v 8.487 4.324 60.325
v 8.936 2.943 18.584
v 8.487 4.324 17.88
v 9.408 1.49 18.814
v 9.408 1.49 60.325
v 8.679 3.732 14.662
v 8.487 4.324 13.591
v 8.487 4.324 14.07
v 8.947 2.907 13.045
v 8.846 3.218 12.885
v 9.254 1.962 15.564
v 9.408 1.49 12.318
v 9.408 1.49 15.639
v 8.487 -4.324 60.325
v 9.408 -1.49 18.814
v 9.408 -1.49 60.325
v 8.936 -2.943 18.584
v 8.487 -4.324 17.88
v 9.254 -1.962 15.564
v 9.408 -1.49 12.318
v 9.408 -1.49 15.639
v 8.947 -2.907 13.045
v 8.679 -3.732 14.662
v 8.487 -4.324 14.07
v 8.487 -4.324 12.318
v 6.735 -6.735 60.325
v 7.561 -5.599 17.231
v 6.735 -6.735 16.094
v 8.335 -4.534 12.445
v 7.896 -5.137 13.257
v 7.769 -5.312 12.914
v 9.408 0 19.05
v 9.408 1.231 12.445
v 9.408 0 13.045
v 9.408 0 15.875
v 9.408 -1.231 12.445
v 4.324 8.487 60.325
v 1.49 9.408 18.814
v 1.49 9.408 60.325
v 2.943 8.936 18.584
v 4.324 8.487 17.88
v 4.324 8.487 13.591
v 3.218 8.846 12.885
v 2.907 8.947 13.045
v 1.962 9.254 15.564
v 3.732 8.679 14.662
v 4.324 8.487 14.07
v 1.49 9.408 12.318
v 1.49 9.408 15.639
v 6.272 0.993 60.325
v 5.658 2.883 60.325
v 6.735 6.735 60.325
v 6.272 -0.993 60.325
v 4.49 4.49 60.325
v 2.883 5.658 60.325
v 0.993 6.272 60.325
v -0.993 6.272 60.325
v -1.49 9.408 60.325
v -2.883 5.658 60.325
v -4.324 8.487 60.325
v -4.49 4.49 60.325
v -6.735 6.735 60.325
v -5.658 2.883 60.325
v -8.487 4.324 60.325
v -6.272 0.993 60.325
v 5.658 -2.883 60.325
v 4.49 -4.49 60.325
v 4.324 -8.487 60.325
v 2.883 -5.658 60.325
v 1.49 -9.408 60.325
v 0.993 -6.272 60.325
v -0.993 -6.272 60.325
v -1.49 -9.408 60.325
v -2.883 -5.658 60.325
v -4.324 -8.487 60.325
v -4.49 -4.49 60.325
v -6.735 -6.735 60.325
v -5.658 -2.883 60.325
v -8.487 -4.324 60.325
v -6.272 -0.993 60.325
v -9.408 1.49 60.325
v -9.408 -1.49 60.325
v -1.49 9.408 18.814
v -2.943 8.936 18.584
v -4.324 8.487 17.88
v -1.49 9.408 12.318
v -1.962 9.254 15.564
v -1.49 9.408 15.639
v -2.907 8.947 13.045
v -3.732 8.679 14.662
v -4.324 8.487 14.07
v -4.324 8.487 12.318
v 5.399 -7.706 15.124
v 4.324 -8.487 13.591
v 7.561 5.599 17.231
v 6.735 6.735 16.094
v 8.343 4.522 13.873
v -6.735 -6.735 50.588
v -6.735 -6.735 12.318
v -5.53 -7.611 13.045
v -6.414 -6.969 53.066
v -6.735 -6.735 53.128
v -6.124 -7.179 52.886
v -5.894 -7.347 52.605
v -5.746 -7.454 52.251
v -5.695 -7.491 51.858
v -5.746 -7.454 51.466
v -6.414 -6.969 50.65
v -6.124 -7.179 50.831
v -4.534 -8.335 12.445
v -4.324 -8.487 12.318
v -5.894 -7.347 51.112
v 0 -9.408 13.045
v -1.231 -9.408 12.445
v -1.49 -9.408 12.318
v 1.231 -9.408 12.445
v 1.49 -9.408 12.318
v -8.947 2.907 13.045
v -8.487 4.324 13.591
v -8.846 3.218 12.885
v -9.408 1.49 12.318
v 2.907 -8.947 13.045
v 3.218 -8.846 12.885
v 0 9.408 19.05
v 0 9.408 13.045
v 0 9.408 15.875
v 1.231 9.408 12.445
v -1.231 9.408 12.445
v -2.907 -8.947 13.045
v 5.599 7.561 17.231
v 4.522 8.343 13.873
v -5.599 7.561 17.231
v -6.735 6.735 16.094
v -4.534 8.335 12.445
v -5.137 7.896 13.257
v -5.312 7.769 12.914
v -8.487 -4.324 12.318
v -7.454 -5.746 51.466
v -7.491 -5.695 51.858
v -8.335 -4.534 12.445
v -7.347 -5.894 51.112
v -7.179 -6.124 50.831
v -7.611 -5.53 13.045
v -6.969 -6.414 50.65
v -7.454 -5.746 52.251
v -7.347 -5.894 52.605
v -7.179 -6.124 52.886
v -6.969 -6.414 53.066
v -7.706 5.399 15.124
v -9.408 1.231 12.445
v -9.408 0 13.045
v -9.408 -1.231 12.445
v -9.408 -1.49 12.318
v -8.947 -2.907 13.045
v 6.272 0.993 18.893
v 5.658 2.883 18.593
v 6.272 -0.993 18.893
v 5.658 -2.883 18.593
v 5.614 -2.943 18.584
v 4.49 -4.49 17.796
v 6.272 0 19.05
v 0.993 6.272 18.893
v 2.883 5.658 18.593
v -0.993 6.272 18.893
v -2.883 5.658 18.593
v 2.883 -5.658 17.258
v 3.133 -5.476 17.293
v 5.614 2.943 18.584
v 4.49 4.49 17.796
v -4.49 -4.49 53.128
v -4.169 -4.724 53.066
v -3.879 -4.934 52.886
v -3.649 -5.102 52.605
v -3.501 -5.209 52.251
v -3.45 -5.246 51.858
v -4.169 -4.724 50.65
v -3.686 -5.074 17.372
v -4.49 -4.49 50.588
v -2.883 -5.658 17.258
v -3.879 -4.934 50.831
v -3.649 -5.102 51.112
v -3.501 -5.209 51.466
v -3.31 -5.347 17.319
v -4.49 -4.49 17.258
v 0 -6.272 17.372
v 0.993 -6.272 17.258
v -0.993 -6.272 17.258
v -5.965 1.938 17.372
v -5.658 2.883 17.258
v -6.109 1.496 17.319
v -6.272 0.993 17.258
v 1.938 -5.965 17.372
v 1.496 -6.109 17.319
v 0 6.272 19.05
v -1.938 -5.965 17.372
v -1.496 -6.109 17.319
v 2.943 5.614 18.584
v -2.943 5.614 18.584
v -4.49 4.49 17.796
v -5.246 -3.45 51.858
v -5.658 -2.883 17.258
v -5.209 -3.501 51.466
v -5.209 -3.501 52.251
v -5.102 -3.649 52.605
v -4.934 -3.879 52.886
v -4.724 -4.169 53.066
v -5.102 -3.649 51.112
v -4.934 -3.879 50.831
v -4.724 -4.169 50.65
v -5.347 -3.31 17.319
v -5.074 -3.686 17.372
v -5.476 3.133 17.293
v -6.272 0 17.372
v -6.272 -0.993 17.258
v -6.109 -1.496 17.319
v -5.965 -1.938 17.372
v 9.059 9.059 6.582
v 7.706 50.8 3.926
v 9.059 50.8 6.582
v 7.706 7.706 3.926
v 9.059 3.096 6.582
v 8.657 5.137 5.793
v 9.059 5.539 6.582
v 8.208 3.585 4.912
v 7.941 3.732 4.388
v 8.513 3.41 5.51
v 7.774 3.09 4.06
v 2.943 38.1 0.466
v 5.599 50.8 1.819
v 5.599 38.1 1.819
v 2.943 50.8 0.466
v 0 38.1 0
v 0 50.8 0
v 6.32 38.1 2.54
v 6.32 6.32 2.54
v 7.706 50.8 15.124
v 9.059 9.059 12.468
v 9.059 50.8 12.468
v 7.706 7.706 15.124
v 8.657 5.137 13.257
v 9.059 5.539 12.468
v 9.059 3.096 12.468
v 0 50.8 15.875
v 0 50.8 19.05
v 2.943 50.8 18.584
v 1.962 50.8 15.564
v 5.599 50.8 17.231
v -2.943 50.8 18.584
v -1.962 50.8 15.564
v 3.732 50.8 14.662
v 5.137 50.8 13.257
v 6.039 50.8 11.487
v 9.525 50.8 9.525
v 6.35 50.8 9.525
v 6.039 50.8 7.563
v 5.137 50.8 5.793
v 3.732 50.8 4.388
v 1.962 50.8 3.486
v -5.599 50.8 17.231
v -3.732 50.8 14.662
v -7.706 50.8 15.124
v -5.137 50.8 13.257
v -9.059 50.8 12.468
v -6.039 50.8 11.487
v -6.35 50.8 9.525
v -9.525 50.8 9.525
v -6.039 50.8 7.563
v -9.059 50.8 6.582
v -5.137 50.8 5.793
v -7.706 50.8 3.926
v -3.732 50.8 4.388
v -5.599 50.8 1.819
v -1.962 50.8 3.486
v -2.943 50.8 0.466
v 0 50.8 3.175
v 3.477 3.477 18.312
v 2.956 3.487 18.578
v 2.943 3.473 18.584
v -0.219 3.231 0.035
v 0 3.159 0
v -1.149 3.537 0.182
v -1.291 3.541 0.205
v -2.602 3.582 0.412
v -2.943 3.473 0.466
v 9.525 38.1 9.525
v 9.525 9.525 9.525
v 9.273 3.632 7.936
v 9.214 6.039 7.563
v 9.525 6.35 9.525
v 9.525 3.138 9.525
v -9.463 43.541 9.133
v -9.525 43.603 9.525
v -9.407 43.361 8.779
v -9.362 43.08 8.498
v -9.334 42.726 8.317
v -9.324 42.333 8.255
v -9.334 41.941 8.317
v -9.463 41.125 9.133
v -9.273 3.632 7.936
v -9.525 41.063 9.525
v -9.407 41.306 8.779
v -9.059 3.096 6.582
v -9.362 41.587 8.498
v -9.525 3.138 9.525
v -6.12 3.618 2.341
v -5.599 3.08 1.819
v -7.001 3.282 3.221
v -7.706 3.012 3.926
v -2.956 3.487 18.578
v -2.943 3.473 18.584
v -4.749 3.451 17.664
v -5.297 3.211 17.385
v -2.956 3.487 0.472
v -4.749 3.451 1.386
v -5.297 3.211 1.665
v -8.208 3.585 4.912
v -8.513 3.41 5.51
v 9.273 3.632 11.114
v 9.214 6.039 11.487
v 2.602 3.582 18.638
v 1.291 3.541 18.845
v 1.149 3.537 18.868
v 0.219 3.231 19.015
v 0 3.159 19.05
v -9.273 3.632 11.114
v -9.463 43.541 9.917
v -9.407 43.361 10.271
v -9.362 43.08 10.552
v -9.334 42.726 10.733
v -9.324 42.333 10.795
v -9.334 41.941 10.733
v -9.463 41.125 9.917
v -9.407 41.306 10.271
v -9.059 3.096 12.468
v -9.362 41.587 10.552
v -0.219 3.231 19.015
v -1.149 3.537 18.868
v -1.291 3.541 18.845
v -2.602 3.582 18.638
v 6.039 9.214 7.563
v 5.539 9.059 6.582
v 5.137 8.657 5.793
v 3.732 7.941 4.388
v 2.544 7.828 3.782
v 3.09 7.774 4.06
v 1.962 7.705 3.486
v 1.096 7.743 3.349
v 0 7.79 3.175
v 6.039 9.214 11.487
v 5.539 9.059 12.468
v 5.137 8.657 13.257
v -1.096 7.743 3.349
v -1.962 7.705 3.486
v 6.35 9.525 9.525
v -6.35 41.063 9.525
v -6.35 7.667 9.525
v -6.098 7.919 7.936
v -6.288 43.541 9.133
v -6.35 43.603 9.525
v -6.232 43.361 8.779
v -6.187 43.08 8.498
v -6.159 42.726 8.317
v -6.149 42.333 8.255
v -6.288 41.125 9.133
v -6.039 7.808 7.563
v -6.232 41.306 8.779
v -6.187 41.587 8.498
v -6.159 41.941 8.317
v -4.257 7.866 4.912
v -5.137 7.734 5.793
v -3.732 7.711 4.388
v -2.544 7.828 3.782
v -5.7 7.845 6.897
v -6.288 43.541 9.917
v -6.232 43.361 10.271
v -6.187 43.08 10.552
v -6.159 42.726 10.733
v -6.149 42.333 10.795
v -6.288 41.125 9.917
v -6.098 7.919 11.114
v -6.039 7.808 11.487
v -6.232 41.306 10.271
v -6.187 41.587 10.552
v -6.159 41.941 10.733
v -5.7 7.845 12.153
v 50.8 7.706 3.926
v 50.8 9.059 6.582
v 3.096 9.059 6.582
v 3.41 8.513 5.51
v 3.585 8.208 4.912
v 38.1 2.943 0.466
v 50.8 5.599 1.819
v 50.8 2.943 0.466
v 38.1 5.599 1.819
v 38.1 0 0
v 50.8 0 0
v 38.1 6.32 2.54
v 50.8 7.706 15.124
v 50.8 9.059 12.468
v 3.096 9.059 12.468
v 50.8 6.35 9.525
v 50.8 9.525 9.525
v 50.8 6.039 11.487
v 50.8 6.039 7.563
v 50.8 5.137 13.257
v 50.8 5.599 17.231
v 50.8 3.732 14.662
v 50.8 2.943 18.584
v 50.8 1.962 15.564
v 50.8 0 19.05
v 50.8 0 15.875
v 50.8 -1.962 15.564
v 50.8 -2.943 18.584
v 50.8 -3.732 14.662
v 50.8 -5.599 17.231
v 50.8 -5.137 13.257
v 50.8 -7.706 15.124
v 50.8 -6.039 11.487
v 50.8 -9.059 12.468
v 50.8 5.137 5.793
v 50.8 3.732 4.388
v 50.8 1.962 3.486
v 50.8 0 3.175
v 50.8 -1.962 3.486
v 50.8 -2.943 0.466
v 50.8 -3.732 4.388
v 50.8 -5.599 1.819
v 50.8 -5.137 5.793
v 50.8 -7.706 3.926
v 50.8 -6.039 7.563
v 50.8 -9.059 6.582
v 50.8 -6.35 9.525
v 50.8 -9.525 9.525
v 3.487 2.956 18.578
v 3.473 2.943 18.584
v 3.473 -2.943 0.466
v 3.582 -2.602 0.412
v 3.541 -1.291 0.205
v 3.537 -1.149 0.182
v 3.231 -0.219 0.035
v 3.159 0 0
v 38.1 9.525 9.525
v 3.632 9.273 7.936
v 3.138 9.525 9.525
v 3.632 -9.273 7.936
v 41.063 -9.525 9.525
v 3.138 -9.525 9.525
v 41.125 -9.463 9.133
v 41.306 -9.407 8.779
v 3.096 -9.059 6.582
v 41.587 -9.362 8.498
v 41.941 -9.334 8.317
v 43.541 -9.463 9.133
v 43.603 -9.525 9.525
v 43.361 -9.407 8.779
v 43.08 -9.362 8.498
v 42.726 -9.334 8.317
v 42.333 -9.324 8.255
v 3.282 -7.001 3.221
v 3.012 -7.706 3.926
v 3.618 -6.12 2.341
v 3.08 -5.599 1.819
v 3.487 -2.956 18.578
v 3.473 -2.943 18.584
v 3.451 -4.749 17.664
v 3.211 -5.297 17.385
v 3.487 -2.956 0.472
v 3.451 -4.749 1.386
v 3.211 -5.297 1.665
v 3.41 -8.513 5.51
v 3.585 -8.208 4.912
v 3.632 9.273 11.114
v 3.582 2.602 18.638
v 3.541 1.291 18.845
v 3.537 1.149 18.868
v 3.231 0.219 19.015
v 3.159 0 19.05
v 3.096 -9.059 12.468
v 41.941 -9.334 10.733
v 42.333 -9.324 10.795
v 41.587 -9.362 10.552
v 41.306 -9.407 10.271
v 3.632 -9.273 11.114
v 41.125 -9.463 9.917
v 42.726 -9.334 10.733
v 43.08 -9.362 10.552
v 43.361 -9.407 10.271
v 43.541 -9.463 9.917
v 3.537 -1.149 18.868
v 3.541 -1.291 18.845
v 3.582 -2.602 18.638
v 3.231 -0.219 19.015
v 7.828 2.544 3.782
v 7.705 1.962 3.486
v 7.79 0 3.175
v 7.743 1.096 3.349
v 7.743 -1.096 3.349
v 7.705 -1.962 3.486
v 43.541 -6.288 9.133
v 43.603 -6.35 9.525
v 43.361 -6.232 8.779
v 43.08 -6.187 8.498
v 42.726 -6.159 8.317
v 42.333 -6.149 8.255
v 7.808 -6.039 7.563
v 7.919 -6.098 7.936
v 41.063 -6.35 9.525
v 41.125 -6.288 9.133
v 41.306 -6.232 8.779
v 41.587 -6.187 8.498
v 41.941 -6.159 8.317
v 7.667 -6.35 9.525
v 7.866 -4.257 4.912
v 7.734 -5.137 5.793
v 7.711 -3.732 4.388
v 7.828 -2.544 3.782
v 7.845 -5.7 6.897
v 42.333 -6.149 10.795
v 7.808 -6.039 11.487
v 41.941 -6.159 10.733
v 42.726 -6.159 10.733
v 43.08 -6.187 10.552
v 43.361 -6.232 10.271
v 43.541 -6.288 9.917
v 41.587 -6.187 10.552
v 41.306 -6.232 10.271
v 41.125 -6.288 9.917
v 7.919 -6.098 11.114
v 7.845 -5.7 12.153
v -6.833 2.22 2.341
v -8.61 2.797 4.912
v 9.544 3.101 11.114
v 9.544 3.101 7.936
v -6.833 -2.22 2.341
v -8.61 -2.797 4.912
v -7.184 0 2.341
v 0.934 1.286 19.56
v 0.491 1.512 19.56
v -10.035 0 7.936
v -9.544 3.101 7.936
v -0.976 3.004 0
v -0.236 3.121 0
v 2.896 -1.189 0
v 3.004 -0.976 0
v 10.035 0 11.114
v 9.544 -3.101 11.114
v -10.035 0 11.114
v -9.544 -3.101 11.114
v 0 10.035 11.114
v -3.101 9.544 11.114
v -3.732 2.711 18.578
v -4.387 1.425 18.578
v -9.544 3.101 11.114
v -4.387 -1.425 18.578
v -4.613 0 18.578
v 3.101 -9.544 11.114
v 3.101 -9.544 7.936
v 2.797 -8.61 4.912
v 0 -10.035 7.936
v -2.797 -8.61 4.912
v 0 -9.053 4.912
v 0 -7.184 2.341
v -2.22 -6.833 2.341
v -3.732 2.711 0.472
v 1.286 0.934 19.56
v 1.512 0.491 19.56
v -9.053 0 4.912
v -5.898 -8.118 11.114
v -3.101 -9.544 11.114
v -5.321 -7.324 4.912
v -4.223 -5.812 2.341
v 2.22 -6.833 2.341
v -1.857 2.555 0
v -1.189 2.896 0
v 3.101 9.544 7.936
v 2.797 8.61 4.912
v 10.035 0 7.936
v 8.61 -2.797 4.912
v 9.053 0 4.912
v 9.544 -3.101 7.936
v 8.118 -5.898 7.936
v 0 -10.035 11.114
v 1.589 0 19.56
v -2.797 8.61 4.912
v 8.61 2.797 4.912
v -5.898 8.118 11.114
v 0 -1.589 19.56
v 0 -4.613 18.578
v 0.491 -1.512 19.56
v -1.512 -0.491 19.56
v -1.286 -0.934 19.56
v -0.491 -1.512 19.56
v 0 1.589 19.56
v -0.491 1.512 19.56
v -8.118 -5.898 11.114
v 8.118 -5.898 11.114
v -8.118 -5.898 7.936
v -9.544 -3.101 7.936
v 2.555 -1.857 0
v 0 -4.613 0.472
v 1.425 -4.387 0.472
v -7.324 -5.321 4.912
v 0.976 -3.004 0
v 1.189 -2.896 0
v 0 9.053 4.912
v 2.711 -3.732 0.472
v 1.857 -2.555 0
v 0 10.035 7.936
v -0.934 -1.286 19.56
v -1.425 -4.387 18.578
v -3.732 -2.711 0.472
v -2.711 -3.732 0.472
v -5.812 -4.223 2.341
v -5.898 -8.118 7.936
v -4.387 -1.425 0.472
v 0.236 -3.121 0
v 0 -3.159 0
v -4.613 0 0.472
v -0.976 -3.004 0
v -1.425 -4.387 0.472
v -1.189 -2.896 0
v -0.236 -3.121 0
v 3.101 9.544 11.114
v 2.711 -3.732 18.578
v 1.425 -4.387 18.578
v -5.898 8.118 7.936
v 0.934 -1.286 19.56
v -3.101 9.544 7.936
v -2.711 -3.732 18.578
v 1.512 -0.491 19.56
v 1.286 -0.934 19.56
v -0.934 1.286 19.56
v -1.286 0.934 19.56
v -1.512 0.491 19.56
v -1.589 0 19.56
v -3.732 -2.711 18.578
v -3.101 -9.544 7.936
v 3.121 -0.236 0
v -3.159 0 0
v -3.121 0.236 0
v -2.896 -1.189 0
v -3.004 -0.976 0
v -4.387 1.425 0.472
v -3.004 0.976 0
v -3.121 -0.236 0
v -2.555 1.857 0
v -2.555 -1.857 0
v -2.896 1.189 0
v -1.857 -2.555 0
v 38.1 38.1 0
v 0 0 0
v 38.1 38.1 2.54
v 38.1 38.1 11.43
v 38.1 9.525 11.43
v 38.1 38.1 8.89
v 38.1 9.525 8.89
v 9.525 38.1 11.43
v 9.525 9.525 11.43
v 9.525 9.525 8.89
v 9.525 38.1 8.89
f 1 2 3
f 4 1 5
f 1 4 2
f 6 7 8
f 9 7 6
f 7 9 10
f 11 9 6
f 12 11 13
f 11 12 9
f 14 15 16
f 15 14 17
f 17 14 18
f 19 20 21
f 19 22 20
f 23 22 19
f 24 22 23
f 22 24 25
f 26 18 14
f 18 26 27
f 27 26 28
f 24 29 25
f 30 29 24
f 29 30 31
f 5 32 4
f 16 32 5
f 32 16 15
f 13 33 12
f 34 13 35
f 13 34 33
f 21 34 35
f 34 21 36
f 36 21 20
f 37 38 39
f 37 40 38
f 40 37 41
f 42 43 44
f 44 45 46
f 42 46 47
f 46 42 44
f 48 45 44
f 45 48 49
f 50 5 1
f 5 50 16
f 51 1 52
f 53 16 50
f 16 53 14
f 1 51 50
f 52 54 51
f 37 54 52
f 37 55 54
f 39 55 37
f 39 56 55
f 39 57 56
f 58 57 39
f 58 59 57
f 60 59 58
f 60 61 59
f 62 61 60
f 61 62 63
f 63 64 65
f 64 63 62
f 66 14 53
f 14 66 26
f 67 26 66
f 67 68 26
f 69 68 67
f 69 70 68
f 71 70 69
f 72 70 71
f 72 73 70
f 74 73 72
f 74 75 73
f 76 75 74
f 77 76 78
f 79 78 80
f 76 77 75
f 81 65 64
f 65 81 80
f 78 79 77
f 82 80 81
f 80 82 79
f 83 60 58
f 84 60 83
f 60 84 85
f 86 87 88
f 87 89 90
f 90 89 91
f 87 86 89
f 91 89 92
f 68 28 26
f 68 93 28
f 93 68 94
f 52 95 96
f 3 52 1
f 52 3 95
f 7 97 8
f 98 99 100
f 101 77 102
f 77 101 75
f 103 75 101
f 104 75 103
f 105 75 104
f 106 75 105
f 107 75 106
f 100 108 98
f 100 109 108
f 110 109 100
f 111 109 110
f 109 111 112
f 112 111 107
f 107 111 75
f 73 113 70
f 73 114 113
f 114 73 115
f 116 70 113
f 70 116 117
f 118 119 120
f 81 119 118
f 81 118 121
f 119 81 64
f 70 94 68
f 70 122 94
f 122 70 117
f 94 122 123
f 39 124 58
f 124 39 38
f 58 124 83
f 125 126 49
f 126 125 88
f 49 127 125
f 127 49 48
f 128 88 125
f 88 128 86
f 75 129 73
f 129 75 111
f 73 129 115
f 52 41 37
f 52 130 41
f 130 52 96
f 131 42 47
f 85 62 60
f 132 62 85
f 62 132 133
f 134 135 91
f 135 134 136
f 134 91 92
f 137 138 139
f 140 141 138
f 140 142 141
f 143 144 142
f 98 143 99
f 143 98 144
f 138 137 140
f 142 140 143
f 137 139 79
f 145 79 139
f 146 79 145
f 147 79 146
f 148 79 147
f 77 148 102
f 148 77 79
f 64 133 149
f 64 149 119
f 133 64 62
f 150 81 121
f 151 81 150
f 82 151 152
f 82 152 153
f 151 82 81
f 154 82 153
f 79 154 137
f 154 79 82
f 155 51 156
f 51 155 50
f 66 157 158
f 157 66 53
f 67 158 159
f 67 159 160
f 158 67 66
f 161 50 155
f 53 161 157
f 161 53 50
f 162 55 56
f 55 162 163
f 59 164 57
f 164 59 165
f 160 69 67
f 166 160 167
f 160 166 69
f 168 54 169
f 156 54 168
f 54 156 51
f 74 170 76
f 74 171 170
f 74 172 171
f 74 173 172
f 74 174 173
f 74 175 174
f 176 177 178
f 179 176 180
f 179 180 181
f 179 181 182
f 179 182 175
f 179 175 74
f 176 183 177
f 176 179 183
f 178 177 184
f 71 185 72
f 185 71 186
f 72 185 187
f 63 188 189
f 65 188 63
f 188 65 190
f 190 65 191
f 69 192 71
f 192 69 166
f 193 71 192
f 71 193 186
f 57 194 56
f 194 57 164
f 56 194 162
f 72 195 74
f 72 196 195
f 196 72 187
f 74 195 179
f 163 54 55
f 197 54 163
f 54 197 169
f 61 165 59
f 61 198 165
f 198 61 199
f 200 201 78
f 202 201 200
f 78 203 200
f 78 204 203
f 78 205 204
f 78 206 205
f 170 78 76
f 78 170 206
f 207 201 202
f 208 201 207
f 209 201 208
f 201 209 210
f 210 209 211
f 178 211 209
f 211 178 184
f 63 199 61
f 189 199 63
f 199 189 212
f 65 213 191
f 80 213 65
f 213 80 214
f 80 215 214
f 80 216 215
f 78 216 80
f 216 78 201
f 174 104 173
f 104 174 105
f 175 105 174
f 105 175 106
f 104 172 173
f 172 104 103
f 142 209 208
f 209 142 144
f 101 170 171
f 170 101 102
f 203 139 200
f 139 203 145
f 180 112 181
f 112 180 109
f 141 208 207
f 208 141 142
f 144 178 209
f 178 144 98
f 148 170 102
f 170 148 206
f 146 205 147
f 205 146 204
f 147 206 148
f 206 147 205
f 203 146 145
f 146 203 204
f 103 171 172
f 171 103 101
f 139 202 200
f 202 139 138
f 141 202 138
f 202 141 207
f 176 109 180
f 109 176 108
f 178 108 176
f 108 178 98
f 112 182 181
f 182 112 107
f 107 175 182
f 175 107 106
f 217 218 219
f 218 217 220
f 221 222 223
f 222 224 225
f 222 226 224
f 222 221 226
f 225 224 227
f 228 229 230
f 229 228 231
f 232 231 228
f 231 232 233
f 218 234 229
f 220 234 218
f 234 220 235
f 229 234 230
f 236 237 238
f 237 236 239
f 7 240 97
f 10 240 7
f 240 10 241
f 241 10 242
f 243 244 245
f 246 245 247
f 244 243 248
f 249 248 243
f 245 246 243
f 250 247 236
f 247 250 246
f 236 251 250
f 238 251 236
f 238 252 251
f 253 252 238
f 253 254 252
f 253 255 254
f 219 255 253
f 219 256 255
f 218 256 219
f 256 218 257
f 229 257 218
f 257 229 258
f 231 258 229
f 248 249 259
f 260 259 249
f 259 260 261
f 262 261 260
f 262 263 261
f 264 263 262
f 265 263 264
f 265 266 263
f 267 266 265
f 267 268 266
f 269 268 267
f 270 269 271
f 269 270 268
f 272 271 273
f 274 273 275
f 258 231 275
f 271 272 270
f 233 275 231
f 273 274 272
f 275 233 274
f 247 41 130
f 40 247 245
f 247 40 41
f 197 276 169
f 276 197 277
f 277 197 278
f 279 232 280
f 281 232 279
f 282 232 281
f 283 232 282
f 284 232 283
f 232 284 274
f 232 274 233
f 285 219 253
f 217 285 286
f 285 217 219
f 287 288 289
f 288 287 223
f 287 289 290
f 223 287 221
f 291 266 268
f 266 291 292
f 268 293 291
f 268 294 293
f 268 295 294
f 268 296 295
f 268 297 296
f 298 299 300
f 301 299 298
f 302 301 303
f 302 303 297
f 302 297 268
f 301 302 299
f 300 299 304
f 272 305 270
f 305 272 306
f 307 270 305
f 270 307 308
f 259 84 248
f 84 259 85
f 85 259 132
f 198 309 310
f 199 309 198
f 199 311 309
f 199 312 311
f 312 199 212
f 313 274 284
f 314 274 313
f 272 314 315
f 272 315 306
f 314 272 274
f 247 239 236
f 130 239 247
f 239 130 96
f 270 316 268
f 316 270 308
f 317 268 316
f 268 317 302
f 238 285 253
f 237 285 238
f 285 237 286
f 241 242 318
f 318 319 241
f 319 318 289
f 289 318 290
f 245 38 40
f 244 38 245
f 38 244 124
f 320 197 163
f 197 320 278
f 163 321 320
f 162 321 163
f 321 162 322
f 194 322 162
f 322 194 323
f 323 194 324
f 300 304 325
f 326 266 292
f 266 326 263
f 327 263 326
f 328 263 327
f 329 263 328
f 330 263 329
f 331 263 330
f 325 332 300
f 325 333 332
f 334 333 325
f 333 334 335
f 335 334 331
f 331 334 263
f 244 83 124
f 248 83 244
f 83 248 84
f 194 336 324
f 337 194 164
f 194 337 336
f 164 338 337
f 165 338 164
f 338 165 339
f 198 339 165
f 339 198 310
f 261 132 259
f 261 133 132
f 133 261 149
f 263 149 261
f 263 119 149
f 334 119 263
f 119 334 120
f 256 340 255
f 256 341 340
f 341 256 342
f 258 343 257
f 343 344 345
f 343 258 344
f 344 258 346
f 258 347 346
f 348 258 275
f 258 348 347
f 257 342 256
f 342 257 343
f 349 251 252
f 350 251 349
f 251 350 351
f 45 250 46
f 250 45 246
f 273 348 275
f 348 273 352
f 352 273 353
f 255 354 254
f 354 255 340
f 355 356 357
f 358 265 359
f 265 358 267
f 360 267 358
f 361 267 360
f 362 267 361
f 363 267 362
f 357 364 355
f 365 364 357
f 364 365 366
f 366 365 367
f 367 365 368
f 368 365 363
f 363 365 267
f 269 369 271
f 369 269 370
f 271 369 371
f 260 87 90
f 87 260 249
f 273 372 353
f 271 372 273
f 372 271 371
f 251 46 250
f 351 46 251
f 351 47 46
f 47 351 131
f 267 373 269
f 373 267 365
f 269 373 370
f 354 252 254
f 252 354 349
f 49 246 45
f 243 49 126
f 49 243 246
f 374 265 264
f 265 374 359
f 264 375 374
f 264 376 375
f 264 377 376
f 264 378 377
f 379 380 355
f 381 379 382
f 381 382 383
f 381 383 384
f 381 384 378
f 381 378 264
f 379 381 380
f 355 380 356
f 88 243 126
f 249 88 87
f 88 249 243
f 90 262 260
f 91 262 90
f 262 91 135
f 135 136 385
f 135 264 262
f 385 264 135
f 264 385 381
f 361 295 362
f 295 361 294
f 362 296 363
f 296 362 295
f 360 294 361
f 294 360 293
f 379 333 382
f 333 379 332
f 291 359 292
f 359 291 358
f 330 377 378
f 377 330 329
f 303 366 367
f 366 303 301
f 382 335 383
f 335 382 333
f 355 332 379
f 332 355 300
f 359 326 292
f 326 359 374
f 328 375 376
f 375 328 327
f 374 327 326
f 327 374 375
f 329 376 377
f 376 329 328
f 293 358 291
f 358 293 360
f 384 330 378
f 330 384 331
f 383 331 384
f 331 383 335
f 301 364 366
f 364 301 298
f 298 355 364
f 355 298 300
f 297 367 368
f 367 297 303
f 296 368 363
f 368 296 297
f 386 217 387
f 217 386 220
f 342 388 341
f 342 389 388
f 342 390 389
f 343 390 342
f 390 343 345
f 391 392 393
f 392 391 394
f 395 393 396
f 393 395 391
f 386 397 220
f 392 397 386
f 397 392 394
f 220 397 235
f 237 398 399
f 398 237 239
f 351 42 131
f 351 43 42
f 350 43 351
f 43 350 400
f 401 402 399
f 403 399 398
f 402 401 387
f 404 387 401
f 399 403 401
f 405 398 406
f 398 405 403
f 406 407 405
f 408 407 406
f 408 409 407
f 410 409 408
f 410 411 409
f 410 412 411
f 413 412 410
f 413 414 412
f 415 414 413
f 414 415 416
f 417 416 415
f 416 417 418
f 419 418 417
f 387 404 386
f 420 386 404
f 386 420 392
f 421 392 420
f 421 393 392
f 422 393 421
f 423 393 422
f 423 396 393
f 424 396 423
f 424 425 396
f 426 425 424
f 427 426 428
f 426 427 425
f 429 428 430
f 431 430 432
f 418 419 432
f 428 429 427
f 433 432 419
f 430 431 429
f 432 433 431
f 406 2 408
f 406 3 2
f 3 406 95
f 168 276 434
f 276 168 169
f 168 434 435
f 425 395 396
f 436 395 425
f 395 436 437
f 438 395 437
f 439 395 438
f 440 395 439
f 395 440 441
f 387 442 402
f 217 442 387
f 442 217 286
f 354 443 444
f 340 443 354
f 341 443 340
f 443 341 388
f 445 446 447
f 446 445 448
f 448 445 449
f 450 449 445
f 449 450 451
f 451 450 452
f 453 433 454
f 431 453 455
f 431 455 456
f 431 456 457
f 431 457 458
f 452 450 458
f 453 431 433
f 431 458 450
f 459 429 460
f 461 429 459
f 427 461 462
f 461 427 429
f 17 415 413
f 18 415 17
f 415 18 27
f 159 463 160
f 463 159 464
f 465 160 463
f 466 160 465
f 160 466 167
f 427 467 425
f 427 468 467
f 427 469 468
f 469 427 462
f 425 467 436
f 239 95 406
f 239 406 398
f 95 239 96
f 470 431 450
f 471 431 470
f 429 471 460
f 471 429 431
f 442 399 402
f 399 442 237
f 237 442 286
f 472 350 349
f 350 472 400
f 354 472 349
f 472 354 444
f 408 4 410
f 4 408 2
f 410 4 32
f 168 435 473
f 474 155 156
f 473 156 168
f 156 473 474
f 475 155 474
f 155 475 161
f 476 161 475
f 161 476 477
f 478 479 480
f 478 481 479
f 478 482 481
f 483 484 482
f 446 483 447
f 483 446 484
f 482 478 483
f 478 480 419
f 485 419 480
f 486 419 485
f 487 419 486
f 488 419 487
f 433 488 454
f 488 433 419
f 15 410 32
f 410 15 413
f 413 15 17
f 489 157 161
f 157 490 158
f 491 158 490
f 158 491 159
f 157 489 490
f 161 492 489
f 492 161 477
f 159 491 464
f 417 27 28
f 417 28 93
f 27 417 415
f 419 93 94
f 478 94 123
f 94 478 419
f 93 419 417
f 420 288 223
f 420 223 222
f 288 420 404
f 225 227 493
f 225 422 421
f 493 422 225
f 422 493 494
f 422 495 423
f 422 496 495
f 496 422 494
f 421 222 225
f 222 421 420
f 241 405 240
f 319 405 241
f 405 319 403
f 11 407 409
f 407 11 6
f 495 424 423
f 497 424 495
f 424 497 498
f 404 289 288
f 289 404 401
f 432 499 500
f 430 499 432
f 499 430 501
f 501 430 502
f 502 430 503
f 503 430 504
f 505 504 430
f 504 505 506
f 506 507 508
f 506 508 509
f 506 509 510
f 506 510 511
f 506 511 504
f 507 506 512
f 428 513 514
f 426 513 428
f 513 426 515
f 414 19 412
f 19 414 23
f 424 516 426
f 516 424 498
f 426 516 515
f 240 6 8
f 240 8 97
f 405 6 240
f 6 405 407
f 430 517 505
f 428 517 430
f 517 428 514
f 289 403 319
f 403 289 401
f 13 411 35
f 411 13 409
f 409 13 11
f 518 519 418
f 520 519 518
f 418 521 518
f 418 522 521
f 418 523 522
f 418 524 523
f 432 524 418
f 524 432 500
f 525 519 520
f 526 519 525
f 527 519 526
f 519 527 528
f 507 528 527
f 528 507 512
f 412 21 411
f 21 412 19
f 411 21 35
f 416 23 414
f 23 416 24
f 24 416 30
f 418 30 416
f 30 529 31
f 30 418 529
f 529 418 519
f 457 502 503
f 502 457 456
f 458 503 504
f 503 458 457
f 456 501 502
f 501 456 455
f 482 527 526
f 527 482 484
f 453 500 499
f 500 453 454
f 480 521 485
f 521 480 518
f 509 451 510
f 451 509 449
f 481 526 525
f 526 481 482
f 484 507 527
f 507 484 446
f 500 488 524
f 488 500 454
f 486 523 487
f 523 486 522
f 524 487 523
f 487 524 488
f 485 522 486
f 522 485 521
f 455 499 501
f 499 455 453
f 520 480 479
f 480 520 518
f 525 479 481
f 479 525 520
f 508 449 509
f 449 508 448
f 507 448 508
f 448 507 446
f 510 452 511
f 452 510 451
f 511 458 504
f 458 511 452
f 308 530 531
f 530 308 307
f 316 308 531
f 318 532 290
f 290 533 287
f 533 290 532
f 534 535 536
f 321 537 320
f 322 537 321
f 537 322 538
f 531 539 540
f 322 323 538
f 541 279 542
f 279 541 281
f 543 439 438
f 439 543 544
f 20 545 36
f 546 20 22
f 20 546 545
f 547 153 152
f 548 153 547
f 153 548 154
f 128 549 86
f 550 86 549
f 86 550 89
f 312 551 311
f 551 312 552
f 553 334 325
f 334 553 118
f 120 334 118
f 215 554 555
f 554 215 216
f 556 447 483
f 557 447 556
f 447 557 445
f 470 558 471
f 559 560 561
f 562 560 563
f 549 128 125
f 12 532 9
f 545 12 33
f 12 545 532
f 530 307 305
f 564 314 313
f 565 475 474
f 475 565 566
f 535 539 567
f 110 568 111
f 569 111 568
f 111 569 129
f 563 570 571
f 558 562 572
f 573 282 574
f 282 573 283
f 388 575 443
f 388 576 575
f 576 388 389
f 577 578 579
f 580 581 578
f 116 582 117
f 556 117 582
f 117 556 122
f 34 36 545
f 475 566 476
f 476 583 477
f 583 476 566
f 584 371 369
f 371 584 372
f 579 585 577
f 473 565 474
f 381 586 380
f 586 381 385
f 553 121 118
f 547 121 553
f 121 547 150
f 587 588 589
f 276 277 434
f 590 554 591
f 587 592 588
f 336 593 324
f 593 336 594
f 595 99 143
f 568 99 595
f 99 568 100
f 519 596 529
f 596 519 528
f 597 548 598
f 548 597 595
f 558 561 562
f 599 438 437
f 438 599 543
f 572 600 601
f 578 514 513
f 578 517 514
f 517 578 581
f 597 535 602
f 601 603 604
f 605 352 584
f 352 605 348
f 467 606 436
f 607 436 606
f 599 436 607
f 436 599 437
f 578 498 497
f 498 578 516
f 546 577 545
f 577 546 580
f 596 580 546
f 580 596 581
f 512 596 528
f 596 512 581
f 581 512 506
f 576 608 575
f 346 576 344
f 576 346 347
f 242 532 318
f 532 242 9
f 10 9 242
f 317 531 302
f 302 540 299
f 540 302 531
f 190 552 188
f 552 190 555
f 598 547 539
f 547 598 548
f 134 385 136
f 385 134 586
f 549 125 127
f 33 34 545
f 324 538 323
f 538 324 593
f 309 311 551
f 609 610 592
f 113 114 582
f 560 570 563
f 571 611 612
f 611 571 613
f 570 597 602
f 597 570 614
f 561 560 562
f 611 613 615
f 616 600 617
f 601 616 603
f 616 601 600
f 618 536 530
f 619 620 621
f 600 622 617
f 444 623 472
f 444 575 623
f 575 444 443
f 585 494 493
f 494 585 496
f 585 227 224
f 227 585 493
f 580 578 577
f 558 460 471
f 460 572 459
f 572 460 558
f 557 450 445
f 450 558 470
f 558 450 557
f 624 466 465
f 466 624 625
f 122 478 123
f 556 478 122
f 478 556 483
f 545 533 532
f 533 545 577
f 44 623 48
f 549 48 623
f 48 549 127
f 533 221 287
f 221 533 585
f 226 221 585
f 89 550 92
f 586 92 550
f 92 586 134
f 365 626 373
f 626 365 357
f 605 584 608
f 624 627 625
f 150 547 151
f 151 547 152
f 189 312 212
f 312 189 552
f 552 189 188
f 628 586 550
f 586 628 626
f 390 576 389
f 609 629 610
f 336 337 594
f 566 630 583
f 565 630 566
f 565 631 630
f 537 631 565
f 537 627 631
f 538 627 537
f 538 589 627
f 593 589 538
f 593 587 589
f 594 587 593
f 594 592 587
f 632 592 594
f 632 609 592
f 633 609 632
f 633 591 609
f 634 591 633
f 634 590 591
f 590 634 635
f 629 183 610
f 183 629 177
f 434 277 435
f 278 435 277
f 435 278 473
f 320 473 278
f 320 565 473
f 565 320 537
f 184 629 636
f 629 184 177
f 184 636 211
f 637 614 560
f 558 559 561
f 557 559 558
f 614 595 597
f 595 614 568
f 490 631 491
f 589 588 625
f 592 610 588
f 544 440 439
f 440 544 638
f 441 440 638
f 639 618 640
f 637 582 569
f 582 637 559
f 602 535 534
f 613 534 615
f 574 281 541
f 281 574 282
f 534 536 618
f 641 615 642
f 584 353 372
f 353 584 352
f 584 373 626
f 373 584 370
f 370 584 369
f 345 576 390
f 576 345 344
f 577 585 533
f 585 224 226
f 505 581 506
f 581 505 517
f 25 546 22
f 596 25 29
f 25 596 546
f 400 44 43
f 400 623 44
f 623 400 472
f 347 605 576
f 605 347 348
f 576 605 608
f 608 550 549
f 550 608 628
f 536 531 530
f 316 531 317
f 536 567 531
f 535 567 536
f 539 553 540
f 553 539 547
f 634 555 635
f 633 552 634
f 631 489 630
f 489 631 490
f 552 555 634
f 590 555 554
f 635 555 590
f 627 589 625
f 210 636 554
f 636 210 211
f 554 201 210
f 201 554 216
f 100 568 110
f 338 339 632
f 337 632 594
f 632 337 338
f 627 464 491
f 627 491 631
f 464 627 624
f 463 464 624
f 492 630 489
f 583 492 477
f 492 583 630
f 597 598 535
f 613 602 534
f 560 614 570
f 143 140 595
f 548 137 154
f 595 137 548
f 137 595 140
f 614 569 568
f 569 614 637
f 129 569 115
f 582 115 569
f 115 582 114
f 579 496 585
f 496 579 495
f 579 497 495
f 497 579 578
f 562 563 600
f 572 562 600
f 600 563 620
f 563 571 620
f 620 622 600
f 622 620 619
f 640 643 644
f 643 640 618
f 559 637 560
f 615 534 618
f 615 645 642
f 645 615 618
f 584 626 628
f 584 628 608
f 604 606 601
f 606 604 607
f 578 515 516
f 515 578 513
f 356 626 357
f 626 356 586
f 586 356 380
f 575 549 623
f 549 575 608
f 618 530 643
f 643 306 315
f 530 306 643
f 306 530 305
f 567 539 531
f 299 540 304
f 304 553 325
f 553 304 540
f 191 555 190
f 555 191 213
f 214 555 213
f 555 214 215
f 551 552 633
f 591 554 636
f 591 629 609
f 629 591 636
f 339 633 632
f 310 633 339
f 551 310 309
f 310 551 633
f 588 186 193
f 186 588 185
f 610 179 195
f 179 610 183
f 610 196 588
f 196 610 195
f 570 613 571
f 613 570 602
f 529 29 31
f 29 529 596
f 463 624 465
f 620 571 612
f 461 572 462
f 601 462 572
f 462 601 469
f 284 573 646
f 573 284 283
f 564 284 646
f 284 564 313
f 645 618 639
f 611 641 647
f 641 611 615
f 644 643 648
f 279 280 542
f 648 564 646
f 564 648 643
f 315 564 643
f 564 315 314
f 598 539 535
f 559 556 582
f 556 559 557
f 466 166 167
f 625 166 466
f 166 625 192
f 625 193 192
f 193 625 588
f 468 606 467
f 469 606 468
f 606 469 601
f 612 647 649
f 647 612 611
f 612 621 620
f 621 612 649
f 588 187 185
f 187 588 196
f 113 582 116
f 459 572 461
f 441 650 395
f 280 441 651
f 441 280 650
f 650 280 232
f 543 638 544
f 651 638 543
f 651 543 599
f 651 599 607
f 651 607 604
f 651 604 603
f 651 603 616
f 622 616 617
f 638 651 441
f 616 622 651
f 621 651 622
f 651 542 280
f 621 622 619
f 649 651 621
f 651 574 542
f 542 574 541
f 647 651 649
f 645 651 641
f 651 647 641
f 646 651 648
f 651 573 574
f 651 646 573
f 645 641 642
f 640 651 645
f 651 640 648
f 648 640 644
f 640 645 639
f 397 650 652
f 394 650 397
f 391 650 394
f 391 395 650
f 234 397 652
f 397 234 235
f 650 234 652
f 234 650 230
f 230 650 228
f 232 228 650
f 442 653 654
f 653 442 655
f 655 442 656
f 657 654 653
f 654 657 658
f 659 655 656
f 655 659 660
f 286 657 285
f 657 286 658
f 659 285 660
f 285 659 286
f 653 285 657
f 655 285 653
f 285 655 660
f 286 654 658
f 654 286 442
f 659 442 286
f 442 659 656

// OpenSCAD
one_inch = 25.4; // for converting inches to mm

// parameters of the corner bearing
bearing_diameter = one_inch * .4; 

// parameters of the dowel holder
d_holder_outer = .75 * one_inch;
d_holder_hole = .5 * one_inch;
d_holder_length = one_inch * 2; 

// parameter of the shelf plane holder
plane_thickness = one_inch *.1;
plane_gap = one_inch * .25;

// screw hole size for all stabilizer scres
screw_hole_diameter = one_inch * .1;

// derived parameters
translation = d_holder_length/2;
vertical_translation=d_holder_outer/2;
subtract_cube_size = bearing_diameter * 2;

// plane_clamp();
corner_assembly_trimmed();


module plane_clamp(ratio) {
	bottom_plane_x = d_holder_length * ratio ;
	bottom_plane_y = d_holder_length * ratio ;

	top_plane_x = bottom_plane_x - d_holder_outer/2;
	top_plane_x_translation = d_holder_outer/2;
	top_plane_y = bottom_plane_y - d_holder_outer/2;
	top_plane_y_translation = d_holder_outer/2;

	difference () {
		translate([0,0,0])
			cube([bottom_plane_x,bottom_plane_y,plane_thickness]);
	}

	vertical_translation = plane_thickness + plane_gap;

	difference () {
		translate([top_plane_x_translation,top_plane_x_translation,vertical_translation])
			cube([top_plane_x,top_plane_y,plane_thickness]);
		//cylinder([plane_thickness * 1.5,
	}
} 

module corner_assembly_trimmed() {
	difference() {
		translate([0,0,vertical_translation])
			corner_assembly();
		translate([-subtract_cube_size/2,-subtract_cube_size/2,-subtract_cube_size])
			cube([subtract_cube_size,subtract_cube_size,subtract_cube_size]);
	}
	plane_clamp(.75);
}
	
module corner_assembly() {
	translate([0,0,translation])
	rotate([0,0,-45]) 
		cylinder_w_hole(d_holder_length,d_holder_outer,d_holder_hole); //z-axis cylinder
	translate([0,translation,0])
	mirror([0,1,0])
	rotate([90,90,0])
		cylinder_w_hole(d_holder_length,d_holder_outer,d_holder_hole); //y-axis cylinder
	translate([translation,0,0])
	rotate([0,90,0])
		cylinder_w_hole(d_holder_length,d_holder_outer,d_holder_hole); //x-axis cylinder
	sphere(bearing_diameter,$fn=20,center =true);
}
	
module cylinder_w_hole(height, outer_diameter, hole_diameter) {
	difference() {
		cylinder(h = height,d1 = outer_diameter, d2 = outer_diameter , center = true, $fn = 20);
		cylinder(h = height*1.5, d1 = hole_diameter, d2 = hole_diameter, center = true, $fn = 20);
		rotate([90,0,0])
		translate([0,height/3,hole_diameter/2])
			cylinder(h = outer_diameter - hole_diameter, d1 = screw_hole_diameter, d2 = screw_hole_diameter, center = true, $fn =20);
	}
}
